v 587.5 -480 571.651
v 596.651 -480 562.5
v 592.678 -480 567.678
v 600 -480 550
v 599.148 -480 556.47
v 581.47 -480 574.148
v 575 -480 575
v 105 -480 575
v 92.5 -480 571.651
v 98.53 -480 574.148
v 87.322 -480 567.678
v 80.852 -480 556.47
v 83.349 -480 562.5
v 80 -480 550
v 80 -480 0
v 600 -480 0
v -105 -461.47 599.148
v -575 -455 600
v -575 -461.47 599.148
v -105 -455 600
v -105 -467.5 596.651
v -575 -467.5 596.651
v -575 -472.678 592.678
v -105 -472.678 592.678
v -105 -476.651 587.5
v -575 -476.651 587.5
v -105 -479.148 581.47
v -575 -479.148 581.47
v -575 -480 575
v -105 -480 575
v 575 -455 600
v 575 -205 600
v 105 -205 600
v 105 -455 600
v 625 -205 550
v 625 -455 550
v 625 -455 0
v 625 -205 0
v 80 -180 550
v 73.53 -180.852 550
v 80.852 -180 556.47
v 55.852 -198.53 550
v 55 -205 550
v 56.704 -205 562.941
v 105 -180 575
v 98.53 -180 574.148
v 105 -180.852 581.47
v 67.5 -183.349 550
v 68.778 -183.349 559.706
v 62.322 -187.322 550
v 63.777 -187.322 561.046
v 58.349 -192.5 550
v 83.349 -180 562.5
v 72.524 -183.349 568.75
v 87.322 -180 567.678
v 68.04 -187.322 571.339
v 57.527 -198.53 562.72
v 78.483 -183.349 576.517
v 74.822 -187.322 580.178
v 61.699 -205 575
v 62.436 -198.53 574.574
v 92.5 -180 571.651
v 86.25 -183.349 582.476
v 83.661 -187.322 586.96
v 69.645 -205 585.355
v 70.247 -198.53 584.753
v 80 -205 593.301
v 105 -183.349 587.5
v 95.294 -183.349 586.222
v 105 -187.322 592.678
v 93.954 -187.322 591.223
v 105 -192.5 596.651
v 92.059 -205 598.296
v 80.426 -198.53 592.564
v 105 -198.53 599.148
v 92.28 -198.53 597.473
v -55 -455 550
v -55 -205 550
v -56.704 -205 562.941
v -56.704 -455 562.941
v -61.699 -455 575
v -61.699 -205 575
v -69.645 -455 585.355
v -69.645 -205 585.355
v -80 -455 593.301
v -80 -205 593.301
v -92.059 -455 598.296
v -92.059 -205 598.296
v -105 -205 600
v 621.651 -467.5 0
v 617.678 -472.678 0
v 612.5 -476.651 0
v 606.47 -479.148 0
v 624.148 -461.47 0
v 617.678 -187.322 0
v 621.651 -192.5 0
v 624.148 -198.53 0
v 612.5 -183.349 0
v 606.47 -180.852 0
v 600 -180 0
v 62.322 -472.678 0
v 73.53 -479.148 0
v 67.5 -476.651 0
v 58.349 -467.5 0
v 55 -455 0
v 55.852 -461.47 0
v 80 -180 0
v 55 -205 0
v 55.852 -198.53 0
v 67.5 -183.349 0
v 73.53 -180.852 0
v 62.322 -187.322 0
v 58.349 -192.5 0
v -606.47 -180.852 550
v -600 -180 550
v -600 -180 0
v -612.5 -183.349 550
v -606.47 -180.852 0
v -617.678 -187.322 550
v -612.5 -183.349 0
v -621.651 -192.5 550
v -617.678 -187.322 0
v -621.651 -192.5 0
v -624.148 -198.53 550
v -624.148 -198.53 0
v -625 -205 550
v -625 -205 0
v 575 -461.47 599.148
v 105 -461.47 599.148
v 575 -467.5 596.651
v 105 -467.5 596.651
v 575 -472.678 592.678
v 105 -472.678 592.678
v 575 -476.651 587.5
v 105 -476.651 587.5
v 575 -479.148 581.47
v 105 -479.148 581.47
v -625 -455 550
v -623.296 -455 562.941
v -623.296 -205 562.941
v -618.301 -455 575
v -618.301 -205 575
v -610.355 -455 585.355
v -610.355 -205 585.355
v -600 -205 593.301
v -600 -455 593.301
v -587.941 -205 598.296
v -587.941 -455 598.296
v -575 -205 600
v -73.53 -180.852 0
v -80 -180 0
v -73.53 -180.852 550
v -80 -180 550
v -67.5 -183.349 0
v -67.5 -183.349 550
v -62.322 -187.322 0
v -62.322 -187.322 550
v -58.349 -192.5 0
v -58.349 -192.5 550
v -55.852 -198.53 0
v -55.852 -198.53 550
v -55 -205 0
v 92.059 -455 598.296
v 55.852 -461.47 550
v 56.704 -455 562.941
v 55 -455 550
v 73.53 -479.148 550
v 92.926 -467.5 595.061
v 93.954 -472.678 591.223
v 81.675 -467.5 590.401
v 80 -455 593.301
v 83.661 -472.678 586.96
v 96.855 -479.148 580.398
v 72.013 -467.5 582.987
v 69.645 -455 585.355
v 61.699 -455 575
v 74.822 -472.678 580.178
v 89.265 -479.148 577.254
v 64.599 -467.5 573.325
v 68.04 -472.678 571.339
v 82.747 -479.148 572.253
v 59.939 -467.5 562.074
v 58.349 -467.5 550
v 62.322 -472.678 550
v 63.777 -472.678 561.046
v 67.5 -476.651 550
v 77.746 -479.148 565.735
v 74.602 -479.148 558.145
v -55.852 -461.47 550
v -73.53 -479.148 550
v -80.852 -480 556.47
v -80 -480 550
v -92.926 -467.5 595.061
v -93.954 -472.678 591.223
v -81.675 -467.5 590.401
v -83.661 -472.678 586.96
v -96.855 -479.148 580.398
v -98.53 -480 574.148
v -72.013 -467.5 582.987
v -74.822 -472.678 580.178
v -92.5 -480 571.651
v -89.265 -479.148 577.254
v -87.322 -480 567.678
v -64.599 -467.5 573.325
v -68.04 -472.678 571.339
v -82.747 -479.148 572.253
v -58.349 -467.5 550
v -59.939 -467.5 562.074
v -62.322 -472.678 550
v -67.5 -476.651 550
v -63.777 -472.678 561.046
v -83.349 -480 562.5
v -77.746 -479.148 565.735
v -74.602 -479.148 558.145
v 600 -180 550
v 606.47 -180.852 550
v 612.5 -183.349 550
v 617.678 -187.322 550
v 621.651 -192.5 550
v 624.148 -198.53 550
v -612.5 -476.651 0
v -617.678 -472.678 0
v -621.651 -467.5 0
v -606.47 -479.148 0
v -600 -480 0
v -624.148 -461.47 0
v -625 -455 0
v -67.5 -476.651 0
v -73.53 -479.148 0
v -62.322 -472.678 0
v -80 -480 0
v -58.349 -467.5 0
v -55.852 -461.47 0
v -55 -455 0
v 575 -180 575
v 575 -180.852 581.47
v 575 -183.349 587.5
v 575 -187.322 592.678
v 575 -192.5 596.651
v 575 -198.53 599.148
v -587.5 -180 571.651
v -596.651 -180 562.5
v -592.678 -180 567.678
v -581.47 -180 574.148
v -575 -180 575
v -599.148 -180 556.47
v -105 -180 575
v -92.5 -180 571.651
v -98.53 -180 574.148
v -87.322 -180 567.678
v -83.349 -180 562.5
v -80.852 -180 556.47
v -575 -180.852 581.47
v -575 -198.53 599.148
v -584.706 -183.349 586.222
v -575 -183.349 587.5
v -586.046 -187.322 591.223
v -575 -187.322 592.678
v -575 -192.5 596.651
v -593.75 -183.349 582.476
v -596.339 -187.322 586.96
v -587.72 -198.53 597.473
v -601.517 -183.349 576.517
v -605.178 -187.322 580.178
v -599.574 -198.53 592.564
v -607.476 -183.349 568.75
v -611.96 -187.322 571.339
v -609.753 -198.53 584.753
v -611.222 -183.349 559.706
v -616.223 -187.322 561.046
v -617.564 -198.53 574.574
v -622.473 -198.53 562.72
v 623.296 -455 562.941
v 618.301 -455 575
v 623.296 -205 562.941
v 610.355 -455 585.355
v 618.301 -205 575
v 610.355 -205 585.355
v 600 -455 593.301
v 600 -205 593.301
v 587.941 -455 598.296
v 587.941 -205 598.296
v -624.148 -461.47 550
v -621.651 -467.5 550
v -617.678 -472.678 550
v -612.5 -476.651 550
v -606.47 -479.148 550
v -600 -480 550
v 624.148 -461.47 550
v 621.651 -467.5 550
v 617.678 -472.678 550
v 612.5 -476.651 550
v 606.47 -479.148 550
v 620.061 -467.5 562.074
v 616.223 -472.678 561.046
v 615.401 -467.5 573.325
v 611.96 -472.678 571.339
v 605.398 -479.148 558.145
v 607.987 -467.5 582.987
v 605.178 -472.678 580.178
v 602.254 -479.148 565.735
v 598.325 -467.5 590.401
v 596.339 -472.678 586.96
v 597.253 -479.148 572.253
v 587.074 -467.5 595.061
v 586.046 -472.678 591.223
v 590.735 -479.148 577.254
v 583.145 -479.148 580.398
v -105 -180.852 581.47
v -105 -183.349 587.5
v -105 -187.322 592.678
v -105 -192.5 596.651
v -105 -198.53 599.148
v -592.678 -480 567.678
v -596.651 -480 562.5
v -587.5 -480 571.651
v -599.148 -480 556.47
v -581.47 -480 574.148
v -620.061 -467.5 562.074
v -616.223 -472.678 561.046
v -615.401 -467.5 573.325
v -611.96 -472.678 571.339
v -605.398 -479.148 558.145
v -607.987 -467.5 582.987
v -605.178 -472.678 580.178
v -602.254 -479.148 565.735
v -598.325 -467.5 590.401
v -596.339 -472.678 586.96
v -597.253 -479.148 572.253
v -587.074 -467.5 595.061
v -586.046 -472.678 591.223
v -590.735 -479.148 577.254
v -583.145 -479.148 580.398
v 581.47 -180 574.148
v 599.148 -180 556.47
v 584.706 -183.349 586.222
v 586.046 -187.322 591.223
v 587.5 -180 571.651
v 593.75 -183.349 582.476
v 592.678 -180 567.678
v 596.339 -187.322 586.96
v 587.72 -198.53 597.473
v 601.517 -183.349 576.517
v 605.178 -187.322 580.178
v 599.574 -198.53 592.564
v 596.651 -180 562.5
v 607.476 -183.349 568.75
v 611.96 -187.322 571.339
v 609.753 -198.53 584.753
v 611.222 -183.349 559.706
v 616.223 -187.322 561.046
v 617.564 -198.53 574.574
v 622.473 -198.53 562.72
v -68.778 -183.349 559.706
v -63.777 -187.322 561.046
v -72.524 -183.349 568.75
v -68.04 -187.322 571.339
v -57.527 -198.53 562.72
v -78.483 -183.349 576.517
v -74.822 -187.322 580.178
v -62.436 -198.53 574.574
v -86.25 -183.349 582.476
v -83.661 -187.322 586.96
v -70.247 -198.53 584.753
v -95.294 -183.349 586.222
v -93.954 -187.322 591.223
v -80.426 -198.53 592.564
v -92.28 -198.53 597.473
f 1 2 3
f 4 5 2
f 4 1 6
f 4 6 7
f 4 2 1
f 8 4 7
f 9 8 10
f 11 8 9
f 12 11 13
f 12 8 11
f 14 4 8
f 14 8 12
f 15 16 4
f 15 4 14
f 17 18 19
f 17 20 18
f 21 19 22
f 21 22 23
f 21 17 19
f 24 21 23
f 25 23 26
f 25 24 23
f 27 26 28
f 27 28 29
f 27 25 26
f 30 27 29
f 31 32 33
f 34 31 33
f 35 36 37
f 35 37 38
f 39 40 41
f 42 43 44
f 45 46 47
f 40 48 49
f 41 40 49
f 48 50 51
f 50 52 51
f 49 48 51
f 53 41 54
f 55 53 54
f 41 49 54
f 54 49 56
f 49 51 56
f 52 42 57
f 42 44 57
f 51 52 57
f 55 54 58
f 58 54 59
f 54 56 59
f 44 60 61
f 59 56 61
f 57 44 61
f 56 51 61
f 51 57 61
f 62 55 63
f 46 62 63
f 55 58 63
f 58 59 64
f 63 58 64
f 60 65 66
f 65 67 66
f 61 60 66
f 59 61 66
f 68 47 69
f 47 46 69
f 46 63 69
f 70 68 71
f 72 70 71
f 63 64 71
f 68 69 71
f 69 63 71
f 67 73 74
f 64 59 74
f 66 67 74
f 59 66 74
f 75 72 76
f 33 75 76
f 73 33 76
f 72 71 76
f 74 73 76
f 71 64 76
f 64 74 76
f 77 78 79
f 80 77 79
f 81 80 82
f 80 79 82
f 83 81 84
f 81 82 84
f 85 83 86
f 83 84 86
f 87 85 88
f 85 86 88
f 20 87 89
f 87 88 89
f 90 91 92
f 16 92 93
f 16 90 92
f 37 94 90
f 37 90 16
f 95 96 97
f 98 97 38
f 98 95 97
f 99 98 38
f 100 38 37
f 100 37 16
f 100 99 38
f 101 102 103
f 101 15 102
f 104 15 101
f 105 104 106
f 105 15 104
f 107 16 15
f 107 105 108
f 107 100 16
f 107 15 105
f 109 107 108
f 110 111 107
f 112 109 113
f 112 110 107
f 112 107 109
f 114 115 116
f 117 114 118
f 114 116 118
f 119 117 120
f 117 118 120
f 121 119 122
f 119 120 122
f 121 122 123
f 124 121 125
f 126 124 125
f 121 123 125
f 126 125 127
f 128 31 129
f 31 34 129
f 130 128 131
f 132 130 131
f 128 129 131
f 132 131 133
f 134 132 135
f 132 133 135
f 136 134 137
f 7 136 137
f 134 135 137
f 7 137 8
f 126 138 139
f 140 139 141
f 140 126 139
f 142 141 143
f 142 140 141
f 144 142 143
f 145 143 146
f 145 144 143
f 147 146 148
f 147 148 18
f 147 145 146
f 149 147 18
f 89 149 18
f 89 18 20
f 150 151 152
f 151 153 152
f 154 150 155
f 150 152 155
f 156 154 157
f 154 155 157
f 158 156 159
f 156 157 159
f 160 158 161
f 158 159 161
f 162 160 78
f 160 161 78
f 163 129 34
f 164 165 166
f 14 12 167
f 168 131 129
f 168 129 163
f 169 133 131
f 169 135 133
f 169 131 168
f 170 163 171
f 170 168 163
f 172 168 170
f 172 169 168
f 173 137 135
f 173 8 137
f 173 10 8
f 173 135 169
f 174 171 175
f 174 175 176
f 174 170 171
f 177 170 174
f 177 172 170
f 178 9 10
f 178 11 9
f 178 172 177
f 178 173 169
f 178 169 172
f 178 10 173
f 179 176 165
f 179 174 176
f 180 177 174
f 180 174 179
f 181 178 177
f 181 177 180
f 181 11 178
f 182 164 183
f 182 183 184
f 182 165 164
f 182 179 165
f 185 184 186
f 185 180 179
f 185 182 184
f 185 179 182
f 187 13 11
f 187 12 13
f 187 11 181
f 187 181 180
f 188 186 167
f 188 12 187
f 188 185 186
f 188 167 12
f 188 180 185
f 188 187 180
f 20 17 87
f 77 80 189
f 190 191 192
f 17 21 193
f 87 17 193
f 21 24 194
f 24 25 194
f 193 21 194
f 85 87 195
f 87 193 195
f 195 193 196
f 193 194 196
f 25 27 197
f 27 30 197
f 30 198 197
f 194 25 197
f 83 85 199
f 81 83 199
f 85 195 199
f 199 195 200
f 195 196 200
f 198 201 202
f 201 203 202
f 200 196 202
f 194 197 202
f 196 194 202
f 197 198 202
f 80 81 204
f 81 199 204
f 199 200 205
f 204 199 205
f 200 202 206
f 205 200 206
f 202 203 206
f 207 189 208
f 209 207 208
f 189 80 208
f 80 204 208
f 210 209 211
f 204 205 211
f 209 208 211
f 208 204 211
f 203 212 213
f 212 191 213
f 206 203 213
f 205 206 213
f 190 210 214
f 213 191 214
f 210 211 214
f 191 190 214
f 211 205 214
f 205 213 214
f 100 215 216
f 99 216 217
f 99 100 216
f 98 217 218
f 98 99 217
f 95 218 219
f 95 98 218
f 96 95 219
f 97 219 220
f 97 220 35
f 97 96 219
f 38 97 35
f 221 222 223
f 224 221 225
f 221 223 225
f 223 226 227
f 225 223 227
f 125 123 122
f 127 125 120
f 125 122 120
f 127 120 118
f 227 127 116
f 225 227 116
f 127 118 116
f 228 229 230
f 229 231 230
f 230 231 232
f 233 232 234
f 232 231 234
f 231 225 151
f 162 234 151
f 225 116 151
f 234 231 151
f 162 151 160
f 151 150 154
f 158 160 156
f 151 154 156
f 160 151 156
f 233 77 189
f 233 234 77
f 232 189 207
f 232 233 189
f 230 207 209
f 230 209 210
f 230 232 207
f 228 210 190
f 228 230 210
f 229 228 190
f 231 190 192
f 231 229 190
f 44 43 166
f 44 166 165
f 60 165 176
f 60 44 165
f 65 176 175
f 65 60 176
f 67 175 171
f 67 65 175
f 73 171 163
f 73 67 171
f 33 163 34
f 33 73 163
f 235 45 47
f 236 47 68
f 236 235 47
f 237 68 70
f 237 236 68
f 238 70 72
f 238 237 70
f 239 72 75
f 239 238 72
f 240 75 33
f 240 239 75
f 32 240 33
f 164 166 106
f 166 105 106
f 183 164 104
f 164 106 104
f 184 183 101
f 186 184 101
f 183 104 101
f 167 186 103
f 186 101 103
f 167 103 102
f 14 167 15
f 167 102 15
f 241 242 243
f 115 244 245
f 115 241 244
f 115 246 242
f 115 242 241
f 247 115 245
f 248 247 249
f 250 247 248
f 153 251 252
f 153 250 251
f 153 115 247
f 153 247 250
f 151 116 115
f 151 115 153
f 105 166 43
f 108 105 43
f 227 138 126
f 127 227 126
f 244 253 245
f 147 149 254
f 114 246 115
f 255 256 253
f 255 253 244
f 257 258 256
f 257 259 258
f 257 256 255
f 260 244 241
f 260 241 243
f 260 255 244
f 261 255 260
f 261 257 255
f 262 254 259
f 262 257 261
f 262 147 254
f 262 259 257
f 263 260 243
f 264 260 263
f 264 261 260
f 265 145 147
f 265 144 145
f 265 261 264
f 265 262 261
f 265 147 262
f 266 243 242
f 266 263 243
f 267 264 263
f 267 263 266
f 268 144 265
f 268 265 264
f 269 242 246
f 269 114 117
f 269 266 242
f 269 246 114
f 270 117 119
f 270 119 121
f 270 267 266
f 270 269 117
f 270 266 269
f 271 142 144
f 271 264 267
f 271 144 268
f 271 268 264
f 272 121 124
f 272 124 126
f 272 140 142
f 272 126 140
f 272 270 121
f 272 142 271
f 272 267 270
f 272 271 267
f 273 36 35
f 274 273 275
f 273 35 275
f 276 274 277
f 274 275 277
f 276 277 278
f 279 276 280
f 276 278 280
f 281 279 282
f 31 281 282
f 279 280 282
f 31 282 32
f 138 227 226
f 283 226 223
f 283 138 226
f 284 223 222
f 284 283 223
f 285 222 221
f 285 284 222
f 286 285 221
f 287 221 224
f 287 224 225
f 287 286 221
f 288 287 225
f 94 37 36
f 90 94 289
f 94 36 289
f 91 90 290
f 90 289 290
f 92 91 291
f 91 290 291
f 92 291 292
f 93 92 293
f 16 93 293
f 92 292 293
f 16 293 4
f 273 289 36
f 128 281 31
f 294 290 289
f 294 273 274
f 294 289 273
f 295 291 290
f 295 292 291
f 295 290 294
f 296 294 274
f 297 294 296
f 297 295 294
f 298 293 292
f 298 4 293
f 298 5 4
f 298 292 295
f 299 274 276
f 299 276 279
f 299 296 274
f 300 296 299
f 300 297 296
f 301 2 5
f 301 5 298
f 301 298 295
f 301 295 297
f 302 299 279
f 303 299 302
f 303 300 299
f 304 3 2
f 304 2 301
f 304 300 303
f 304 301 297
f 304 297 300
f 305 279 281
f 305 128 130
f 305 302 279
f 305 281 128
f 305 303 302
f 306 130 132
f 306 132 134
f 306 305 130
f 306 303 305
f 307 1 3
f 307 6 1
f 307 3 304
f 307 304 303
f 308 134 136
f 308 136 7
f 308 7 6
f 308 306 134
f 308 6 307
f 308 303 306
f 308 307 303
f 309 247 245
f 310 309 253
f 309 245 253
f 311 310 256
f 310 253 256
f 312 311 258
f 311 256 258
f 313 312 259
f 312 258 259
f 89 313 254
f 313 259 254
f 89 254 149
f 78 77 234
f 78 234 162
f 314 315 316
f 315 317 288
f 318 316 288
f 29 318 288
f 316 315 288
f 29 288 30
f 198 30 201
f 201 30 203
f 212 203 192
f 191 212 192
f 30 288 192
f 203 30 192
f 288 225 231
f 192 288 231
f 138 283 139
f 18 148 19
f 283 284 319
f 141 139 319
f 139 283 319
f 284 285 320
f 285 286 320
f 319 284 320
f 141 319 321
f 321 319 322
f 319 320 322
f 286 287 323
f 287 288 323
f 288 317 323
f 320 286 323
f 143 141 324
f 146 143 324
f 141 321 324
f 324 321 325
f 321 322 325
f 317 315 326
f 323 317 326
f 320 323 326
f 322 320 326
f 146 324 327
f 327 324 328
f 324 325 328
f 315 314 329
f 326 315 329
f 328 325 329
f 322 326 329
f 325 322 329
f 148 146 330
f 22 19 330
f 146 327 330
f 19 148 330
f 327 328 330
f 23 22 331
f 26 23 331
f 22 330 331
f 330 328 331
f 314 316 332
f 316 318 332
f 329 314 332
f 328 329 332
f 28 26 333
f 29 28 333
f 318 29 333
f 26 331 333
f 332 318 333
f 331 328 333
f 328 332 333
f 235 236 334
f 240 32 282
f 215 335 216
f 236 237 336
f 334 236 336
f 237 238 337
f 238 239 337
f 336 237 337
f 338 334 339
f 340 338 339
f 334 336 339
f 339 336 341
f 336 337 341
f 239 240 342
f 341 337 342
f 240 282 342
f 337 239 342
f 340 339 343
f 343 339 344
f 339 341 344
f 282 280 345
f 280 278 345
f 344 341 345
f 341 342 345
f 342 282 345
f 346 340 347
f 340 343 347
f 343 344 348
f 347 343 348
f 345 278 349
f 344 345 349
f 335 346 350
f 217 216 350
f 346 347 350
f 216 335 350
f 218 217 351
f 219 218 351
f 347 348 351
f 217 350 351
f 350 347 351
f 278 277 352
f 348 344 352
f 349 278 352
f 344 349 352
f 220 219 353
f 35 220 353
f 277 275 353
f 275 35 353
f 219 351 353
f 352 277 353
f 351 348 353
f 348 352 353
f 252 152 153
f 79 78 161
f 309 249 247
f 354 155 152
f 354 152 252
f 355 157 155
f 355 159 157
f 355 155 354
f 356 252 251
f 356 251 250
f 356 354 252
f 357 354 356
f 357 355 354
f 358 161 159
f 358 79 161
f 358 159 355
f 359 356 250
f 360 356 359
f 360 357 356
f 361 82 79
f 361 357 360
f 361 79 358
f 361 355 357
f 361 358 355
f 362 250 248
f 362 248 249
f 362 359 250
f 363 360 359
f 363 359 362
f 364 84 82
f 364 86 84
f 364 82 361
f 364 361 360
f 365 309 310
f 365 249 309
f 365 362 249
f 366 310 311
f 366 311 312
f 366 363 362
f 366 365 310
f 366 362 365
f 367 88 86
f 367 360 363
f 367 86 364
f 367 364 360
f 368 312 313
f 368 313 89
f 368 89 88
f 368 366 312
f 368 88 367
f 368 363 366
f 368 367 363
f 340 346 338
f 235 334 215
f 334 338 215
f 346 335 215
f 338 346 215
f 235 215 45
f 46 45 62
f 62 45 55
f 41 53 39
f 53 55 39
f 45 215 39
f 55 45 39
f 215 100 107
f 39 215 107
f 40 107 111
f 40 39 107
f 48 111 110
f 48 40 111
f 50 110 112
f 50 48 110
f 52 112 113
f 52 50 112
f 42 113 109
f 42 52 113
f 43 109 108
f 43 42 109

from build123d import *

# Parameters (mm, degrees)
F0_W     = 570
F0_H     = 300
F1_DEPTH = 600
F2_R     = 50
F3_R     = 25


with BuildPart() as f1:
    # F0 (on Top) → F1 (new body)
    with BuildSketch(Plane.XY):
        with Locations((-340, -330)):
            Rectangle(F0_W, F0_H)
    extrude(amount=F1_DEPTH)

    # F2
    f2_edges = [f1.edges().sort_by_distance(p)[0] for p in [
        (-625, -330, 600),
        (-55, -330, 600),
    ]]
    fillet(f2_edges, radius=F2_R)

    # F3
    f3_edges = [f1.edges().sort_by_distance(p)[0] for p in [
        (-625, -480, 275),
        (-340, -480, 600),
        (-55, -480, 275),
        (-55, -180, 275),
    ]]
    fillet(f3_edges, radius=F3_R)


with BuildPart() as f4_1:
    # F4: instance of F1
    add(f1.part.mirror(Plane.YZ))


solid = Compound([f1.part, f4_1.part])
